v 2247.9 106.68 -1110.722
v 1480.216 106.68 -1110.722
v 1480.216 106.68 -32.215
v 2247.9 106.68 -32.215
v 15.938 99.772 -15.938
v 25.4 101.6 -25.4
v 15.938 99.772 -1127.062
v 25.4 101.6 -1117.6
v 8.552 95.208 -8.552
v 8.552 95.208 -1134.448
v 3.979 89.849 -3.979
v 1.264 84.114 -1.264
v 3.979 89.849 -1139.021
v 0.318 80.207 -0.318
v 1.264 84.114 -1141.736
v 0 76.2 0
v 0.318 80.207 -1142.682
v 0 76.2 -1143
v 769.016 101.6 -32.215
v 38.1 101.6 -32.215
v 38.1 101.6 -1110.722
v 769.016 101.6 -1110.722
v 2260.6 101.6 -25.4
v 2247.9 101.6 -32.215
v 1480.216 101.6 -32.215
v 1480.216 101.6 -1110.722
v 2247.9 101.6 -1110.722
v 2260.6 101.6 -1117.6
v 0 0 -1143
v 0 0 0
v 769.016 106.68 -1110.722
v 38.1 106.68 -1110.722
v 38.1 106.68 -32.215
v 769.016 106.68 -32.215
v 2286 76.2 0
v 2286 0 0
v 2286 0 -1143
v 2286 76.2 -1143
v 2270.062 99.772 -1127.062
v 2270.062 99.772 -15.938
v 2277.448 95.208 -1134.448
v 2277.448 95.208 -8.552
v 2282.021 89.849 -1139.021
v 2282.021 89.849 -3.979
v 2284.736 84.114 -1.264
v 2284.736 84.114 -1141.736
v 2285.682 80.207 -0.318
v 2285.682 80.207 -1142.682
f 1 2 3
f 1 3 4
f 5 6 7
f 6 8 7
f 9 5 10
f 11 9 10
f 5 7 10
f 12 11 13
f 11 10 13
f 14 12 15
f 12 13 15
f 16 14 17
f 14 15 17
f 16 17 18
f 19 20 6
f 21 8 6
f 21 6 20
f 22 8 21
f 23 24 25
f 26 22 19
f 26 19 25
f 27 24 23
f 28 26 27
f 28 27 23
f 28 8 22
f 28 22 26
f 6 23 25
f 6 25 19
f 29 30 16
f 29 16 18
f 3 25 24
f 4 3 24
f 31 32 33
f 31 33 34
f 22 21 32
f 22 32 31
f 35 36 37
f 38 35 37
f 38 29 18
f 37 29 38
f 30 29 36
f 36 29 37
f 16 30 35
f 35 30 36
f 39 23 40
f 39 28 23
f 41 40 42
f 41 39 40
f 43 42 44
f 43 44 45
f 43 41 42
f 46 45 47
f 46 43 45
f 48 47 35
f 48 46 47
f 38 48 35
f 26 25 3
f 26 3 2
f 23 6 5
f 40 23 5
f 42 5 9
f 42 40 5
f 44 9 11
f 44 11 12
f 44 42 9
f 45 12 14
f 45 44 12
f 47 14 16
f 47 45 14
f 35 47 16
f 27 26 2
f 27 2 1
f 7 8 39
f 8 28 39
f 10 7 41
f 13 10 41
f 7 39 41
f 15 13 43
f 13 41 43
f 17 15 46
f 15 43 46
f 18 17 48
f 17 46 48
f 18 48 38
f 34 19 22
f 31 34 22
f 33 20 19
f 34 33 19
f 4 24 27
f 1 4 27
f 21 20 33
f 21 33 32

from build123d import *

# Parameters (mm, degrees)
SKETCH1_W           = 2286
SKETCH1_H           = 1143
BOSS_EXTRUDE1_DEPTH = 101.6
SKETCH2_W           = 730.915860416
SKETCH2_H           = 1078.506958481
SKETCH2_W_2         = 767.684139584
CUT_EXTRUDE1_DEPTH  = 88.9
SKETCH3_W           = 730.915860416
SKETCH3_H           = 1078.506958481
SKETCH3_W_2         = 767.684139584
BOSS_EXTRUDE2_DEPTH = 93.98
FILLET1_R           = 25.4


with BuildPart() as part:
    # Sketch1 → Boss-Extrude1 (new body)
    with BuildSketch(Plane(origin=(0, 0, 0), x_dir=(1, 0, 0), z_dir=(0, 1, 0))):
        with Locations((1143, 571.5)):
            Rectangle(SKETCH1_W, SKETCH1_H)
    extrude(amount=BOSS_EXTRUDE1_DEPTH)

    # Sketch2 → Cut-Extrude1 (cut)
    with BuildSketch(Plane(origin=(0, 101.6, 0), x_dir=(1, 0, 0), z_dir=(0, 1, 0))):
        with Locations((403.557930208, 571.468483779)):
            Rectangle(SKETCH2_W, SKETCH2_H)
        with Locations((1864.057930208, 571.468483779)):
            Rectangle(SKETCH2_W_2, SKETCH2_H)
    extrude(amount=-CUT_EXTRUDE1_DEPTH, mode=Mode.SUBTRACT)

    # Sketch3 → Boss-Extrude2 (add)
    with BuildSketch(Plane(origin=(0, 12.7, 0), x_dir=(1, 0, 0), z_dir=(0, 1, 0))):
        with Locations((403.557930208, 571.468483779)):
            Rectangle(SKETCH3_W, SKETCH3_H)
        with Locations((1864.057930208, 571.468483779)):
            Rectangle(SKETCH3_W_2, SKETCH3_H)
    extrude(amount=BOSS_EXTRUDE2_DEPTH)

    # Fillet1
    fillet1_edges = [part.edges().sort_by_distance(p)[0] for p in [
        (2286, 101.6, -571.5),
        (1143, 101.6, -1143),
        (0, 101.6, -571.5),
        (1143, 101.6, 0),
    ]]
    fillet(fillet1_edges, radius=FILLET1_R)


solid = part.part
